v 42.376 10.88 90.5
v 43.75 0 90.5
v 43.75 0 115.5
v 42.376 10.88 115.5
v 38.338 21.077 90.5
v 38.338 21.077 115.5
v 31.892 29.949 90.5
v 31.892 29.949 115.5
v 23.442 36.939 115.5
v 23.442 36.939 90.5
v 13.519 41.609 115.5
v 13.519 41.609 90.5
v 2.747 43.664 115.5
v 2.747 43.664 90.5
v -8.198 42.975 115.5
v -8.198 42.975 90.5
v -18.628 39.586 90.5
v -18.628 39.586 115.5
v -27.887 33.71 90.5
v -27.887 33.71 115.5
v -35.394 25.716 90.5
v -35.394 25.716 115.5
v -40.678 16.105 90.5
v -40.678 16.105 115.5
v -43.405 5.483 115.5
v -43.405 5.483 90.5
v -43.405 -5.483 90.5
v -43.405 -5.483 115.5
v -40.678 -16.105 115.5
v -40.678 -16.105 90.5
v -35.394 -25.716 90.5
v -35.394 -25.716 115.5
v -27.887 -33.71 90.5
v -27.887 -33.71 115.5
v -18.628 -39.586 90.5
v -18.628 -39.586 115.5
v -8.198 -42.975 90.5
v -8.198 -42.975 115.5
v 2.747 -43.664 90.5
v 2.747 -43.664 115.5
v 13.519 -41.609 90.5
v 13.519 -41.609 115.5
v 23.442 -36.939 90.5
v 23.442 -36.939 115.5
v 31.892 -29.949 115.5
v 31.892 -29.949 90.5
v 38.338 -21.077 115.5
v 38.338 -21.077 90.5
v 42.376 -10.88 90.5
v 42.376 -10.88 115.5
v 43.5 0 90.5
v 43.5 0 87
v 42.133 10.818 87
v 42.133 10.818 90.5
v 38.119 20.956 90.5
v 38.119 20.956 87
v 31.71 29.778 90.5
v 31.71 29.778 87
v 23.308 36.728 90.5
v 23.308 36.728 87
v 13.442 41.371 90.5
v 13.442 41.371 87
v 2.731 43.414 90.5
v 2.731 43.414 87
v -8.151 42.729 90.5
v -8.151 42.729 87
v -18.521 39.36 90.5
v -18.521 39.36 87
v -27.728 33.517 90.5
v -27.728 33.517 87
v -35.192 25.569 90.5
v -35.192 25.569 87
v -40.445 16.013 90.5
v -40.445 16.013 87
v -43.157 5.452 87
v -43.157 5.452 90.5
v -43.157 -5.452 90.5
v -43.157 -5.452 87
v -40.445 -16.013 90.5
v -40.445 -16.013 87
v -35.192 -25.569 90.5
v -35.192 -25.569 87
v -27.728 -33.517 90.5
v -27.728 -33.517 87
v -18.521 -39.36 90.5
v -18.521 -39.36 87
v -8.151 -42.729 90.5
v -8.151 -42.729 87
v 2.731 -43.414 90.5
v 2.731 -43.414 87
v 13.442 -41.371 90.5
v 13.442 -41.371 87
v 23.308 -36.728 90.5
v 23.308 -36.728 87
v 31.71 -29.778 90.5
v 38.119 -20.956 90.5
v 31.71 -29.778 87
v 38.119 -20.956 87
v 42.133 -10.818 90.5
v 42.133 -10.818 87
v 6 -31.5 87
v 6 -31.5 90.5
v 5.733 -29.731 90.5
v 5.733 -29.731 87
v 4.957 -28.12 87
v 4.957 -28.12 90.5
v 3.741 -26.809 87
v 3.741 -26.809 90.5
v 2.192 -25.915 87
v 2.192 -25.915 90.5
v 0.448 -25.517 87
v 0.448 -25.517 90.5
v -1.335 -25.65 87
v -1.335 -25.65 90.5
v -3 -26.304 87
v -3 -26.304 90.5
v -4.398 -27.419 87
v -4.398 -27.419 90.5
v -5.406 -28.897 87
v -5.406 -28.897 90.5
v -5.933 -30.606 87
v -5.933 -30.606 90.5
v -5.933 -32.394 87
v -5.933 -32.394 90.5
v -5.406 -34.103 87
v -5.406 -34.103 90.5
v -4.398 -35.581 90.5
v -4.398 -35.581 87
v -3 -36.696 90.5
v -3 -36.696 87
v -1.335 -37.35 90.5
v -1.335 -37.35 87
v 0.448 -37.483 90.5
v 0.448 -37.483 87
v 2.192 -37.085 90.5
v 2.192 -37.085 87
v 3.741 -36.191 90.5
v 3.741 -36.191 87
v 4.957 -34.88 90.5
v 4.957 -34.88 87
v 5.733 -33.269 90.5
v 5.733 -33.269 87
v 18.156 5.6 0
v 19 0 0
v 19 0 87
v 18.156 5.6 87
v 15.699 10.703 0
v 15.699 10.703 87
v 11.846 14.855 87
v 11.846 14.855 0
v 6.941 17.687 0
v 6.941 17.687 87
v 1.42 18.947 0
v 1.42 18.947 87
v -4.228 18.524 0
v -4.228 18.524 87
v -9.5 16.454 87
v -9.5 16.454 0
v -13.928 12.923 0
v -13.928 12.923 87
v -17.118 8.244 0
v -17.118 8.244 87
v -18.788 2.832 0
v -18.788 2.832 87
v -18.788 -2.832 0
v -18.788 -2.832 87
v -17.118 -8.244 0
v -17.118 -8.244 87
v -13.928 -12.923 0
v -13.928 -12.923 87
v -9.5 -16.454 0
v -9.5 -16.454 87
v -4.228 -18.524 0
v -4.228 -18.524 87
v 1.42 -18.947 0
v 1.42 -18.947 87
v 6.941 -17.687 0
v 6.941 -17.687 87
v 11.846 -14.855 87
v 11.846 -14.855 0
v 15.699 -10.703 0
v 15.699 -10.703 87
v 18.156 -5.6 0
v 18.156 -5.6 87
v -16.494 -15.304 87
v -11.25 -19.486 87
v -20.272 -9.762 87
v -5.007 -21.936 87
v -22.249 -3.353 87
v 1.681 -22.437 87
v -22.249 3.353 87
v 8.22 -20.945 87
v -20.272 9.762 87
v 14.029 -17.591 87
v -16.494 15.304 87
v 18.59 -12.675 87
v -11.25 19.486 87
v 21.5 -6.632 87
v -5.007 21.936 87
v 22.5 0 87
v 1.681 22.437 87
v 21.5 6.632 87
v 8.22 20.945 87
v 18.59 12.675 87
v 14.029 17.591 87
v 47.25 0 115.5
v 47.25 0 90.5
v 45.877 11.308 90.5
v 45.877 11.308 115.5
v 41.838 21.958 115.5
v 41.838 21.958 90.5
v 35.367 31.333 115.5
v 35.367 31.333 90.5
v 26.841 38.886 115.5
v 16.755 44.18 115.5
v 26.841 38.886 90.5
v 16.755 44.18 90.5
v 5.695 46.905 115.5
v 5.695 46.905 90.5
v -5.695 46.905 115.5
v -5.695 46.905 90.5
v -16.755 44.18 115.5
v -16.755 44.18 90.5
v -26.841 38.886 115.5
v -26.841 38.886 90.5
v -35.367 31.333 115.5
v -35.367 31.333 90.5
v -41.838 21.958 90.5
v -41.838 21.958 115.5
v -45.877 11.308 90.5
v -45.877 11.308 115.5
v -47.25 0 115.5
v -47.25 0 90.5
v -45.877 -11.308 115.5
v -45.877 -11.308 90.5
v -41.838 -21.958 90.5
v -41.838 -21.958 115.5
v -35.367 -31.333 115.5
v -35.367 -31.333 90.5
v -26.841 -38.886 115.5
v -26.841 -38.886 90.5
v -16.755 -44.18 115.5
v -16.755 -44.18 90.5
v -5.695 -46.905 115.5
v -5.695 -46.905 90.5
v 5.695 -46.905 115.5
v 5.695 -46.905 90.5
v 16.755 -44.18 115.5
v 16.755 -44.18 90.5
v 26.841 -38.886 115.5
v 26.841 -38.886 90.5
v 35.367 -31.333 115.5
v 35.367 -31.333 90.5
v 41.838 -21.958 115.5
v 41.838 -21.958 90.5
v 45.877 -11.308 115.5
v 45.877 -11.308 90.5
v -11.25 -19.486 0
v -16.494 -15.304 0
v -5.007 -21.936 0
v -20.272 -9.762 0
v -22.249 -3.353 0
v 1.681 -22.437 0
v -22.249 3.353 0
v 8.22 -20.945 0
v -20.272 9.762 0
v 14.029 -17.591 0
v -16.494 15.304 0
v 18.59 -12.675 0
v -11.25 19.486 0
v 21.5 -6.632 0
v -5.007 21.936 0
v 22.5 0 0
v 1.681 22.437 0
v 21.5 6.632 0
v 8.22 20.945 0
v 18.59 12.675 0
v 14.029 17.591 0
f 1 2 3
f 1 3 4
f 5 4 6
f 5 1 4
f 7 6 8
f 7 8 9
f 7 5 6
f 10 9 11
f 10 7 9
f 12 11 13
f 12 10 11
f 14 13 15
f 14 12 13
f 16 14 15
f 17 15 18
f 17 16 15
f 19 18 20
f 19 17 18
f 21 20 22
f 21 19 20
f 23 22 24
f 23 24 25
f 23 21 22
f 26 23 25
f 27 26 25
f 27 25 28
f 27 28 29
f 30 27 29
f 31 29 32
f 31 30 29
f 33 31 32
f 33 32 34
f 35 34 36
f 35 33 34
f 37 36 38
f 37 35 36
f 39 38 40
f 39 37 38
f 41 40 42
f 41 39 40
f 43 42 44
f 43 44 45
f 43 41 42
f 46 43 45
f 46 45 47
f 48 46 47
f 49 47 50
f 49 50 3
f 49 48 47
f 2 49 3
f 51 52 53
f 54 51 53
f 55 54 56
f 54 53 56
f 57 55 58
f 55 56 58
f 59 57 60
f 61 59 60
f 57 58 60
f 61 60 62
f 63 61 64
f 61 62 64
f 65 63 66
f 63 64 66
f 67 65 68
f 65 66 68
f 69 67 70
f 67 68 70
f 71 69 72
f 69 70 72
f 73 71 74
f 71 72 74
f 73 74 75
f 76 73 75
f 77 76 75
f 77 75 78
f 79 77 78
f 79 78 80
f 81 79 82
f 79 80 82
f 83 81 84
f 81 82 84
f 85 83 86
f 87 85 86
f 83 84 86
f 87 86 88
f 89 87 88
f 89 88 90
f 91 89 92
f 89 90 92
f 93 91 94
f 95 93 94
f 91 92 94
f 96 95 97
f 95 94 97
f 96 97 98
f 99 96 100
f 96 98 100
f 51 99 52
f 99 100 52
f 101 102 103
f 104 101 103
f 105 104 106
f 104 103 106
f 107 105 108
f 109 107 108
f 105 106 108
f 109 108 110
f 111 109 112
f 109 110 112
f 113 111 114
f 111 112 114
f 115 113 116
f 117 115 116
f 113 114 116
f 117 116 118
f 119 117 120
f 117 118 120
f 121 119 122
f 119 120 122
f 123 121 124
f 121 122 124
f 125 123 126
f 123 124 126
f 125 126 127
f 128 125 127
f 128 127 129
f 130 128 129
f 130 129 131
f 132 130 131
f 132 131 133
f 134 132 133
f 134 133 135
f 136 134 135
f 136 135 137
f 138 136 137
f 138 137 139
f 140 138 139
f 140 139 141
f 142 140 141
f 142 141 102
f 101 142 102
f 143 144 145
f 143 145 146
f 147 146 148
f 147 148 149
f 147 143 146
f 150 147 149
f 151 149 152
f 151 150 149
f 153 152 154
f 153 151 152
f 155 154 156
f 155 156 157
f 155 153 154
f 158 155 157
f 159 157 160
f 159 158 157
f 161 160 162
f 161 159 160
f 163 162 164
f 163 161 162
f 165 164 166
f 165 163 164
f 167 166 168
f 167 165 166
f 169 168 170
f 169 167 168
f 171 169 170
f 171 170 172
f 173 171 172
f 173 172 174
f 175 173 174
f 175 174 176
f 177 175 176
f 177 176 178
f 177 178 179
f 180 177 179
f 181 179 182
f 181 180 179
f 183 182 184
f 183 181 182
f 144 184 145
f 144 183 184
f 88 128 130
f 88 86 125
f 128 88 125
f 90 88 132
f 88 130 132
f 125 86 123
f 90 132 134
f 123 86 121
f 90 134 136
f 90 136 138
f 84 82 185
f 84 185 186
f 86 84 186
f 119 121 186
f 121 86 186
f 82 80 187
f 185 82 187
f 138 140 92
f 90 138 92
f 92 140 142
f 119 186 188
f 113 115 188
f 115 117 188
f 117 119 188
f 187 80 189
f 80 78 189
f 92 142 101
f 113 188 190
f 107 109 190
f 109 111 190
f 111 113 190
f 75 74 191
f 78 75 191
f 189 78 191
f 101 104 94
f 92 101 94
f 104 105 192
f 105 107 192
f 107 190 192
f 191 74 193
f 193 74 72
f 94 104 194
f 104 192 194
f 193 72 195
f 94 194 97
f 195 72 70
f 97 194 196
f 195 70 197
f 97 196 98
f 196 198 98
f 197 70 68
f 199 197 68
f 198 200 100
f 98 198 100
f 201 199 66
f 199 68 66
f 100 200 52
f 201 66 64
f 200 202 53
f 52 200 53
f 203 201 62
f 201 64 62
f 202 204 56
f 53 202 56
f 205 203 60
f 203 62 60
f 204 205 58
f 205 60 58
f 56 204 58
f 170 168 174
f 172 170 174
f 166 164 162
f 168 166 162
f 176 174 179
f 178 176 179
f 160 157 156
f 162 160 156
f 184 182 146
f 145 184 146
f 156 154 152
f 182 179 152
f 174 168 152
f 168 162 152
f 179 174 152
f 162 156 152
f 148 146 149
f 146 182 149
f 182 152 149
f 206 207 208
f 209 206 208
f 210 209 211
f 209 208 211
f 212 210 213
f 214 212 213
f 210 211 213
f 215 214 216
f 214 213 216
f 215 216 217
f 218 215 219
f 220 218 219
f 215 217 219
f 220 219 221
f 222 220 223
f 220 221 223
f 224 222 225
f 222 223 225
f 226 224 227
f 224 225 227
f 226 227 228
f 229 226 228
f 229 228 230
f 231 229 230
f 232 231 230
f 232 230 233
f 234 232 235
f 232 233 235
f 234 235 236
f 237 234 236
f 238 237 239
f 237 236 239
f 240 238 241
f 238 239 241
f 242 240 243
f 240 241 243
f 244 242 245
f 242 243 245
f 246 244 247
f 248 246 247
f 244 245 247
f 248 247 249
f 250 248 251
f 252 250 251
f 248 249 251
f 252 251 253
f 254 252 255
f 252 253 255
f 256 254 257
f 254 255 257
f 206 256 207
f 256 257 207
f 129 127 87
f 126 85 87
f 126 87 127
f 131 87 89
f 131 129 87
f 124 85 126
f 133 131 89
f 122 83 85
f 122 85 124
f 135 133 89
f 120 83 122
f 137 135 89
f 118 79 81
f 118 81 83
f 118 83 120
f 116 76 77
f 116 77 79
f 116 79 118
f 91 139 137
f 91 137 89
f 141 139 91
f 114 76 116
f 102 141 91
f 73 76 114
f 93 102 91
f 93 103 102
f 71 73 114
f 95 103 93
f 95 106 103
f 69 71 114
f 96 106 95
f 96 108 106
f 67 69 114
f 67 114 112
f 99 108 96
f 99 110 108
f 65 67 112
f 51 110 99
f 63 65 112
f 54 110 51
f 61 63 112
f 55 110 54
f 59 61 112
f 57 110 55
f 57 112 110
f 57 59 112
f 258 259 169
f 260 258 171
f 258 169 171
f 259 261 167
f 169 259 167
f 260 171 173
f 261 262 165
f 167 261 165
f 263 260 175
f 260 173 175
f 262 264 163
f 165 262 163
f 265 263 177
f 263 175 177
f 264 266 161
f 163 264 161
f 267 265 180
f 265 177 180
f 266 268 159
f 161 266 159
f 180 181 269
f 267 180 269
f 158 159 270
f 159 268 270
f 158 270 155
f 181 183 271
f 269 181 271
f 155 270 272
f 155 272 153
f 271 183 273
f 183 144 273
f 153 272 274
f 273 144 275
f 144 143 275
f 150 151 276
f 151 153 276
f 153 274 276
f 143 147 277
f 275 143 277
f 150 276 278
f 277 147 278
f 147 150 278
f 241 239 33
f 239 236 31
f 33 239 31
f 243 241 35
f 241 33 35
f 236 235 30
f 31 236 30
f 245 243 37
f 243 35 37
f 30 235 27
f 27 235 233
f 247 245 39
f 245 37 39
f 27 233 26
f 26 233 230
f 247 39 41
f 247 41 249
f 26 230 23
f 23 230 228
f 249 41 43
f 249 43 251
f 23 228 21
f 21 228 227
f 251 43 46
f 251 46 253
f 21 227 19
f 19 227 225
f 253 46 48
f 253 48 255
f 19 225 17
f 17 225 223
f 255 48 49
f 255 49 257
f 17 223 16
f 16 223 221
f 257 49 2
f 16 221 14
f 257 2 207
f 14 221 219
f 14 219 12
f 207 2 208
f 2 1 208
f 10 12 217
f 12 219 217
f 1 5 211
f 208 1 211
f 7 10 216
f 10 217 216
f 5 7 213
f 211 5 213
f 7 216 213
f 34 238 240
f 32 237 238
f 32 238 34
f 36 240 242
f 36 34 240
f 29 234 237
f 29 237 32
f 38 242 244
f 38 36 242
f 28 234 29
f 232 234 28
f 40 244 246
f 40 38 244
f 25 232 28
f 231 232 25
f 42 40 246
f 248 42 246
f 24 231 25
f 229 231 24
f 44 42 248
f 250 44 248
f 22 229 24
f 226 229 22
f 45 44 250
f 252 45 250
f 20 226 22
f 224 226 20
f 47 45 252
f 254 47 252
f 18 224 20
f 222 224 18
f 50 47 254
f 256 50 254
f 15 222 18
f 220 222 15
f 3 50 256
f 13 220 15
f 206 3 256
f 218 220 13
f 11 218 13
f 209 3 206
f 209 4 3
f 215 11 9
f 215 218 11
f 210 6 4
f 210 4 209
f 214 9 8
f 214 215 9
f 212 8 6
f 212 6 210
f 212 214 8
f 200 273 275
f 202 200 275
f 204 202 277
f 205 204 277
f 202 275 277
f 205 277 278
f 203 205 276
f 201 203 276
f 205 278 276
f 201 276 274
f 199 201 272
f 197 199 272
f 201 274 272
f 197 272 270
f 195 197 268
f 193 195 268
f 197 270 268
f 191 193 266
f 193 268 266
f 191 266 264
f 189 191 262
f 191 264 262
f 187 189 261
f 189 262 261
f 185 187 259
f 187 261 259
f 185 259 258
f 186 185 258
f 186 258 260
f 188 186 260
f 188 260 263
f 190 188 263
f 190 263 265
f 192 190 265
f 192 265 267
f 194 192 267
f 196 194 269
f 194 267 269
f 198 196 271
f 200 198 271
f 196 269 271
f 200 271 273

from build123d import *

# Parameters (mm, degrees)
F0_R     = 22.5
F0_R_2   = 19
F1_DEPTH = 87
F2_R     = 43.5
F3_DEPTH = 3.5
F4_R     = 6
F5_DEPTH = 90.501
F6_R     = 47.25
F6_R_2   = 43.75
F7_DEPTH = 25


with BuildPart() as f1:
    # F0 (on Top) → F1 (new body)
    with BuildSketch(Plane.XY):
        Circle(F0_R)
        Circle(F0_R_2, mode=Mode.SUBTRACT)
    extrude(amount=F1_DEPTH)

    # F2 (on face) → F3 (join)
    with BuildSketch(Plane.XY.offset(87)):
        Circle(F2_R)
    extrude(amount=F3_DEPTH)

    # F4 (on face) → F5 (cut, through all)
    with BuildSketch(Plane.XY.offset(90.5)):
        with Locations((0, -31.5)):
            Circle(F4_R)
    extrude(amount=-F5_DEPTH, mode=Mode.SUBTRACT)


with BuildPart() as f7:
    # F6 (on face) → F7 (new body)
    with BuildSketch(Plane.XY.offset(90.5)):
        Circle(F6_R)
        Circle(F6_R_2, mode=Mode.SUBTRACT)
    extrude(amount=F7_DEPTH)


solid = Compound([f1.part, f7.part])
